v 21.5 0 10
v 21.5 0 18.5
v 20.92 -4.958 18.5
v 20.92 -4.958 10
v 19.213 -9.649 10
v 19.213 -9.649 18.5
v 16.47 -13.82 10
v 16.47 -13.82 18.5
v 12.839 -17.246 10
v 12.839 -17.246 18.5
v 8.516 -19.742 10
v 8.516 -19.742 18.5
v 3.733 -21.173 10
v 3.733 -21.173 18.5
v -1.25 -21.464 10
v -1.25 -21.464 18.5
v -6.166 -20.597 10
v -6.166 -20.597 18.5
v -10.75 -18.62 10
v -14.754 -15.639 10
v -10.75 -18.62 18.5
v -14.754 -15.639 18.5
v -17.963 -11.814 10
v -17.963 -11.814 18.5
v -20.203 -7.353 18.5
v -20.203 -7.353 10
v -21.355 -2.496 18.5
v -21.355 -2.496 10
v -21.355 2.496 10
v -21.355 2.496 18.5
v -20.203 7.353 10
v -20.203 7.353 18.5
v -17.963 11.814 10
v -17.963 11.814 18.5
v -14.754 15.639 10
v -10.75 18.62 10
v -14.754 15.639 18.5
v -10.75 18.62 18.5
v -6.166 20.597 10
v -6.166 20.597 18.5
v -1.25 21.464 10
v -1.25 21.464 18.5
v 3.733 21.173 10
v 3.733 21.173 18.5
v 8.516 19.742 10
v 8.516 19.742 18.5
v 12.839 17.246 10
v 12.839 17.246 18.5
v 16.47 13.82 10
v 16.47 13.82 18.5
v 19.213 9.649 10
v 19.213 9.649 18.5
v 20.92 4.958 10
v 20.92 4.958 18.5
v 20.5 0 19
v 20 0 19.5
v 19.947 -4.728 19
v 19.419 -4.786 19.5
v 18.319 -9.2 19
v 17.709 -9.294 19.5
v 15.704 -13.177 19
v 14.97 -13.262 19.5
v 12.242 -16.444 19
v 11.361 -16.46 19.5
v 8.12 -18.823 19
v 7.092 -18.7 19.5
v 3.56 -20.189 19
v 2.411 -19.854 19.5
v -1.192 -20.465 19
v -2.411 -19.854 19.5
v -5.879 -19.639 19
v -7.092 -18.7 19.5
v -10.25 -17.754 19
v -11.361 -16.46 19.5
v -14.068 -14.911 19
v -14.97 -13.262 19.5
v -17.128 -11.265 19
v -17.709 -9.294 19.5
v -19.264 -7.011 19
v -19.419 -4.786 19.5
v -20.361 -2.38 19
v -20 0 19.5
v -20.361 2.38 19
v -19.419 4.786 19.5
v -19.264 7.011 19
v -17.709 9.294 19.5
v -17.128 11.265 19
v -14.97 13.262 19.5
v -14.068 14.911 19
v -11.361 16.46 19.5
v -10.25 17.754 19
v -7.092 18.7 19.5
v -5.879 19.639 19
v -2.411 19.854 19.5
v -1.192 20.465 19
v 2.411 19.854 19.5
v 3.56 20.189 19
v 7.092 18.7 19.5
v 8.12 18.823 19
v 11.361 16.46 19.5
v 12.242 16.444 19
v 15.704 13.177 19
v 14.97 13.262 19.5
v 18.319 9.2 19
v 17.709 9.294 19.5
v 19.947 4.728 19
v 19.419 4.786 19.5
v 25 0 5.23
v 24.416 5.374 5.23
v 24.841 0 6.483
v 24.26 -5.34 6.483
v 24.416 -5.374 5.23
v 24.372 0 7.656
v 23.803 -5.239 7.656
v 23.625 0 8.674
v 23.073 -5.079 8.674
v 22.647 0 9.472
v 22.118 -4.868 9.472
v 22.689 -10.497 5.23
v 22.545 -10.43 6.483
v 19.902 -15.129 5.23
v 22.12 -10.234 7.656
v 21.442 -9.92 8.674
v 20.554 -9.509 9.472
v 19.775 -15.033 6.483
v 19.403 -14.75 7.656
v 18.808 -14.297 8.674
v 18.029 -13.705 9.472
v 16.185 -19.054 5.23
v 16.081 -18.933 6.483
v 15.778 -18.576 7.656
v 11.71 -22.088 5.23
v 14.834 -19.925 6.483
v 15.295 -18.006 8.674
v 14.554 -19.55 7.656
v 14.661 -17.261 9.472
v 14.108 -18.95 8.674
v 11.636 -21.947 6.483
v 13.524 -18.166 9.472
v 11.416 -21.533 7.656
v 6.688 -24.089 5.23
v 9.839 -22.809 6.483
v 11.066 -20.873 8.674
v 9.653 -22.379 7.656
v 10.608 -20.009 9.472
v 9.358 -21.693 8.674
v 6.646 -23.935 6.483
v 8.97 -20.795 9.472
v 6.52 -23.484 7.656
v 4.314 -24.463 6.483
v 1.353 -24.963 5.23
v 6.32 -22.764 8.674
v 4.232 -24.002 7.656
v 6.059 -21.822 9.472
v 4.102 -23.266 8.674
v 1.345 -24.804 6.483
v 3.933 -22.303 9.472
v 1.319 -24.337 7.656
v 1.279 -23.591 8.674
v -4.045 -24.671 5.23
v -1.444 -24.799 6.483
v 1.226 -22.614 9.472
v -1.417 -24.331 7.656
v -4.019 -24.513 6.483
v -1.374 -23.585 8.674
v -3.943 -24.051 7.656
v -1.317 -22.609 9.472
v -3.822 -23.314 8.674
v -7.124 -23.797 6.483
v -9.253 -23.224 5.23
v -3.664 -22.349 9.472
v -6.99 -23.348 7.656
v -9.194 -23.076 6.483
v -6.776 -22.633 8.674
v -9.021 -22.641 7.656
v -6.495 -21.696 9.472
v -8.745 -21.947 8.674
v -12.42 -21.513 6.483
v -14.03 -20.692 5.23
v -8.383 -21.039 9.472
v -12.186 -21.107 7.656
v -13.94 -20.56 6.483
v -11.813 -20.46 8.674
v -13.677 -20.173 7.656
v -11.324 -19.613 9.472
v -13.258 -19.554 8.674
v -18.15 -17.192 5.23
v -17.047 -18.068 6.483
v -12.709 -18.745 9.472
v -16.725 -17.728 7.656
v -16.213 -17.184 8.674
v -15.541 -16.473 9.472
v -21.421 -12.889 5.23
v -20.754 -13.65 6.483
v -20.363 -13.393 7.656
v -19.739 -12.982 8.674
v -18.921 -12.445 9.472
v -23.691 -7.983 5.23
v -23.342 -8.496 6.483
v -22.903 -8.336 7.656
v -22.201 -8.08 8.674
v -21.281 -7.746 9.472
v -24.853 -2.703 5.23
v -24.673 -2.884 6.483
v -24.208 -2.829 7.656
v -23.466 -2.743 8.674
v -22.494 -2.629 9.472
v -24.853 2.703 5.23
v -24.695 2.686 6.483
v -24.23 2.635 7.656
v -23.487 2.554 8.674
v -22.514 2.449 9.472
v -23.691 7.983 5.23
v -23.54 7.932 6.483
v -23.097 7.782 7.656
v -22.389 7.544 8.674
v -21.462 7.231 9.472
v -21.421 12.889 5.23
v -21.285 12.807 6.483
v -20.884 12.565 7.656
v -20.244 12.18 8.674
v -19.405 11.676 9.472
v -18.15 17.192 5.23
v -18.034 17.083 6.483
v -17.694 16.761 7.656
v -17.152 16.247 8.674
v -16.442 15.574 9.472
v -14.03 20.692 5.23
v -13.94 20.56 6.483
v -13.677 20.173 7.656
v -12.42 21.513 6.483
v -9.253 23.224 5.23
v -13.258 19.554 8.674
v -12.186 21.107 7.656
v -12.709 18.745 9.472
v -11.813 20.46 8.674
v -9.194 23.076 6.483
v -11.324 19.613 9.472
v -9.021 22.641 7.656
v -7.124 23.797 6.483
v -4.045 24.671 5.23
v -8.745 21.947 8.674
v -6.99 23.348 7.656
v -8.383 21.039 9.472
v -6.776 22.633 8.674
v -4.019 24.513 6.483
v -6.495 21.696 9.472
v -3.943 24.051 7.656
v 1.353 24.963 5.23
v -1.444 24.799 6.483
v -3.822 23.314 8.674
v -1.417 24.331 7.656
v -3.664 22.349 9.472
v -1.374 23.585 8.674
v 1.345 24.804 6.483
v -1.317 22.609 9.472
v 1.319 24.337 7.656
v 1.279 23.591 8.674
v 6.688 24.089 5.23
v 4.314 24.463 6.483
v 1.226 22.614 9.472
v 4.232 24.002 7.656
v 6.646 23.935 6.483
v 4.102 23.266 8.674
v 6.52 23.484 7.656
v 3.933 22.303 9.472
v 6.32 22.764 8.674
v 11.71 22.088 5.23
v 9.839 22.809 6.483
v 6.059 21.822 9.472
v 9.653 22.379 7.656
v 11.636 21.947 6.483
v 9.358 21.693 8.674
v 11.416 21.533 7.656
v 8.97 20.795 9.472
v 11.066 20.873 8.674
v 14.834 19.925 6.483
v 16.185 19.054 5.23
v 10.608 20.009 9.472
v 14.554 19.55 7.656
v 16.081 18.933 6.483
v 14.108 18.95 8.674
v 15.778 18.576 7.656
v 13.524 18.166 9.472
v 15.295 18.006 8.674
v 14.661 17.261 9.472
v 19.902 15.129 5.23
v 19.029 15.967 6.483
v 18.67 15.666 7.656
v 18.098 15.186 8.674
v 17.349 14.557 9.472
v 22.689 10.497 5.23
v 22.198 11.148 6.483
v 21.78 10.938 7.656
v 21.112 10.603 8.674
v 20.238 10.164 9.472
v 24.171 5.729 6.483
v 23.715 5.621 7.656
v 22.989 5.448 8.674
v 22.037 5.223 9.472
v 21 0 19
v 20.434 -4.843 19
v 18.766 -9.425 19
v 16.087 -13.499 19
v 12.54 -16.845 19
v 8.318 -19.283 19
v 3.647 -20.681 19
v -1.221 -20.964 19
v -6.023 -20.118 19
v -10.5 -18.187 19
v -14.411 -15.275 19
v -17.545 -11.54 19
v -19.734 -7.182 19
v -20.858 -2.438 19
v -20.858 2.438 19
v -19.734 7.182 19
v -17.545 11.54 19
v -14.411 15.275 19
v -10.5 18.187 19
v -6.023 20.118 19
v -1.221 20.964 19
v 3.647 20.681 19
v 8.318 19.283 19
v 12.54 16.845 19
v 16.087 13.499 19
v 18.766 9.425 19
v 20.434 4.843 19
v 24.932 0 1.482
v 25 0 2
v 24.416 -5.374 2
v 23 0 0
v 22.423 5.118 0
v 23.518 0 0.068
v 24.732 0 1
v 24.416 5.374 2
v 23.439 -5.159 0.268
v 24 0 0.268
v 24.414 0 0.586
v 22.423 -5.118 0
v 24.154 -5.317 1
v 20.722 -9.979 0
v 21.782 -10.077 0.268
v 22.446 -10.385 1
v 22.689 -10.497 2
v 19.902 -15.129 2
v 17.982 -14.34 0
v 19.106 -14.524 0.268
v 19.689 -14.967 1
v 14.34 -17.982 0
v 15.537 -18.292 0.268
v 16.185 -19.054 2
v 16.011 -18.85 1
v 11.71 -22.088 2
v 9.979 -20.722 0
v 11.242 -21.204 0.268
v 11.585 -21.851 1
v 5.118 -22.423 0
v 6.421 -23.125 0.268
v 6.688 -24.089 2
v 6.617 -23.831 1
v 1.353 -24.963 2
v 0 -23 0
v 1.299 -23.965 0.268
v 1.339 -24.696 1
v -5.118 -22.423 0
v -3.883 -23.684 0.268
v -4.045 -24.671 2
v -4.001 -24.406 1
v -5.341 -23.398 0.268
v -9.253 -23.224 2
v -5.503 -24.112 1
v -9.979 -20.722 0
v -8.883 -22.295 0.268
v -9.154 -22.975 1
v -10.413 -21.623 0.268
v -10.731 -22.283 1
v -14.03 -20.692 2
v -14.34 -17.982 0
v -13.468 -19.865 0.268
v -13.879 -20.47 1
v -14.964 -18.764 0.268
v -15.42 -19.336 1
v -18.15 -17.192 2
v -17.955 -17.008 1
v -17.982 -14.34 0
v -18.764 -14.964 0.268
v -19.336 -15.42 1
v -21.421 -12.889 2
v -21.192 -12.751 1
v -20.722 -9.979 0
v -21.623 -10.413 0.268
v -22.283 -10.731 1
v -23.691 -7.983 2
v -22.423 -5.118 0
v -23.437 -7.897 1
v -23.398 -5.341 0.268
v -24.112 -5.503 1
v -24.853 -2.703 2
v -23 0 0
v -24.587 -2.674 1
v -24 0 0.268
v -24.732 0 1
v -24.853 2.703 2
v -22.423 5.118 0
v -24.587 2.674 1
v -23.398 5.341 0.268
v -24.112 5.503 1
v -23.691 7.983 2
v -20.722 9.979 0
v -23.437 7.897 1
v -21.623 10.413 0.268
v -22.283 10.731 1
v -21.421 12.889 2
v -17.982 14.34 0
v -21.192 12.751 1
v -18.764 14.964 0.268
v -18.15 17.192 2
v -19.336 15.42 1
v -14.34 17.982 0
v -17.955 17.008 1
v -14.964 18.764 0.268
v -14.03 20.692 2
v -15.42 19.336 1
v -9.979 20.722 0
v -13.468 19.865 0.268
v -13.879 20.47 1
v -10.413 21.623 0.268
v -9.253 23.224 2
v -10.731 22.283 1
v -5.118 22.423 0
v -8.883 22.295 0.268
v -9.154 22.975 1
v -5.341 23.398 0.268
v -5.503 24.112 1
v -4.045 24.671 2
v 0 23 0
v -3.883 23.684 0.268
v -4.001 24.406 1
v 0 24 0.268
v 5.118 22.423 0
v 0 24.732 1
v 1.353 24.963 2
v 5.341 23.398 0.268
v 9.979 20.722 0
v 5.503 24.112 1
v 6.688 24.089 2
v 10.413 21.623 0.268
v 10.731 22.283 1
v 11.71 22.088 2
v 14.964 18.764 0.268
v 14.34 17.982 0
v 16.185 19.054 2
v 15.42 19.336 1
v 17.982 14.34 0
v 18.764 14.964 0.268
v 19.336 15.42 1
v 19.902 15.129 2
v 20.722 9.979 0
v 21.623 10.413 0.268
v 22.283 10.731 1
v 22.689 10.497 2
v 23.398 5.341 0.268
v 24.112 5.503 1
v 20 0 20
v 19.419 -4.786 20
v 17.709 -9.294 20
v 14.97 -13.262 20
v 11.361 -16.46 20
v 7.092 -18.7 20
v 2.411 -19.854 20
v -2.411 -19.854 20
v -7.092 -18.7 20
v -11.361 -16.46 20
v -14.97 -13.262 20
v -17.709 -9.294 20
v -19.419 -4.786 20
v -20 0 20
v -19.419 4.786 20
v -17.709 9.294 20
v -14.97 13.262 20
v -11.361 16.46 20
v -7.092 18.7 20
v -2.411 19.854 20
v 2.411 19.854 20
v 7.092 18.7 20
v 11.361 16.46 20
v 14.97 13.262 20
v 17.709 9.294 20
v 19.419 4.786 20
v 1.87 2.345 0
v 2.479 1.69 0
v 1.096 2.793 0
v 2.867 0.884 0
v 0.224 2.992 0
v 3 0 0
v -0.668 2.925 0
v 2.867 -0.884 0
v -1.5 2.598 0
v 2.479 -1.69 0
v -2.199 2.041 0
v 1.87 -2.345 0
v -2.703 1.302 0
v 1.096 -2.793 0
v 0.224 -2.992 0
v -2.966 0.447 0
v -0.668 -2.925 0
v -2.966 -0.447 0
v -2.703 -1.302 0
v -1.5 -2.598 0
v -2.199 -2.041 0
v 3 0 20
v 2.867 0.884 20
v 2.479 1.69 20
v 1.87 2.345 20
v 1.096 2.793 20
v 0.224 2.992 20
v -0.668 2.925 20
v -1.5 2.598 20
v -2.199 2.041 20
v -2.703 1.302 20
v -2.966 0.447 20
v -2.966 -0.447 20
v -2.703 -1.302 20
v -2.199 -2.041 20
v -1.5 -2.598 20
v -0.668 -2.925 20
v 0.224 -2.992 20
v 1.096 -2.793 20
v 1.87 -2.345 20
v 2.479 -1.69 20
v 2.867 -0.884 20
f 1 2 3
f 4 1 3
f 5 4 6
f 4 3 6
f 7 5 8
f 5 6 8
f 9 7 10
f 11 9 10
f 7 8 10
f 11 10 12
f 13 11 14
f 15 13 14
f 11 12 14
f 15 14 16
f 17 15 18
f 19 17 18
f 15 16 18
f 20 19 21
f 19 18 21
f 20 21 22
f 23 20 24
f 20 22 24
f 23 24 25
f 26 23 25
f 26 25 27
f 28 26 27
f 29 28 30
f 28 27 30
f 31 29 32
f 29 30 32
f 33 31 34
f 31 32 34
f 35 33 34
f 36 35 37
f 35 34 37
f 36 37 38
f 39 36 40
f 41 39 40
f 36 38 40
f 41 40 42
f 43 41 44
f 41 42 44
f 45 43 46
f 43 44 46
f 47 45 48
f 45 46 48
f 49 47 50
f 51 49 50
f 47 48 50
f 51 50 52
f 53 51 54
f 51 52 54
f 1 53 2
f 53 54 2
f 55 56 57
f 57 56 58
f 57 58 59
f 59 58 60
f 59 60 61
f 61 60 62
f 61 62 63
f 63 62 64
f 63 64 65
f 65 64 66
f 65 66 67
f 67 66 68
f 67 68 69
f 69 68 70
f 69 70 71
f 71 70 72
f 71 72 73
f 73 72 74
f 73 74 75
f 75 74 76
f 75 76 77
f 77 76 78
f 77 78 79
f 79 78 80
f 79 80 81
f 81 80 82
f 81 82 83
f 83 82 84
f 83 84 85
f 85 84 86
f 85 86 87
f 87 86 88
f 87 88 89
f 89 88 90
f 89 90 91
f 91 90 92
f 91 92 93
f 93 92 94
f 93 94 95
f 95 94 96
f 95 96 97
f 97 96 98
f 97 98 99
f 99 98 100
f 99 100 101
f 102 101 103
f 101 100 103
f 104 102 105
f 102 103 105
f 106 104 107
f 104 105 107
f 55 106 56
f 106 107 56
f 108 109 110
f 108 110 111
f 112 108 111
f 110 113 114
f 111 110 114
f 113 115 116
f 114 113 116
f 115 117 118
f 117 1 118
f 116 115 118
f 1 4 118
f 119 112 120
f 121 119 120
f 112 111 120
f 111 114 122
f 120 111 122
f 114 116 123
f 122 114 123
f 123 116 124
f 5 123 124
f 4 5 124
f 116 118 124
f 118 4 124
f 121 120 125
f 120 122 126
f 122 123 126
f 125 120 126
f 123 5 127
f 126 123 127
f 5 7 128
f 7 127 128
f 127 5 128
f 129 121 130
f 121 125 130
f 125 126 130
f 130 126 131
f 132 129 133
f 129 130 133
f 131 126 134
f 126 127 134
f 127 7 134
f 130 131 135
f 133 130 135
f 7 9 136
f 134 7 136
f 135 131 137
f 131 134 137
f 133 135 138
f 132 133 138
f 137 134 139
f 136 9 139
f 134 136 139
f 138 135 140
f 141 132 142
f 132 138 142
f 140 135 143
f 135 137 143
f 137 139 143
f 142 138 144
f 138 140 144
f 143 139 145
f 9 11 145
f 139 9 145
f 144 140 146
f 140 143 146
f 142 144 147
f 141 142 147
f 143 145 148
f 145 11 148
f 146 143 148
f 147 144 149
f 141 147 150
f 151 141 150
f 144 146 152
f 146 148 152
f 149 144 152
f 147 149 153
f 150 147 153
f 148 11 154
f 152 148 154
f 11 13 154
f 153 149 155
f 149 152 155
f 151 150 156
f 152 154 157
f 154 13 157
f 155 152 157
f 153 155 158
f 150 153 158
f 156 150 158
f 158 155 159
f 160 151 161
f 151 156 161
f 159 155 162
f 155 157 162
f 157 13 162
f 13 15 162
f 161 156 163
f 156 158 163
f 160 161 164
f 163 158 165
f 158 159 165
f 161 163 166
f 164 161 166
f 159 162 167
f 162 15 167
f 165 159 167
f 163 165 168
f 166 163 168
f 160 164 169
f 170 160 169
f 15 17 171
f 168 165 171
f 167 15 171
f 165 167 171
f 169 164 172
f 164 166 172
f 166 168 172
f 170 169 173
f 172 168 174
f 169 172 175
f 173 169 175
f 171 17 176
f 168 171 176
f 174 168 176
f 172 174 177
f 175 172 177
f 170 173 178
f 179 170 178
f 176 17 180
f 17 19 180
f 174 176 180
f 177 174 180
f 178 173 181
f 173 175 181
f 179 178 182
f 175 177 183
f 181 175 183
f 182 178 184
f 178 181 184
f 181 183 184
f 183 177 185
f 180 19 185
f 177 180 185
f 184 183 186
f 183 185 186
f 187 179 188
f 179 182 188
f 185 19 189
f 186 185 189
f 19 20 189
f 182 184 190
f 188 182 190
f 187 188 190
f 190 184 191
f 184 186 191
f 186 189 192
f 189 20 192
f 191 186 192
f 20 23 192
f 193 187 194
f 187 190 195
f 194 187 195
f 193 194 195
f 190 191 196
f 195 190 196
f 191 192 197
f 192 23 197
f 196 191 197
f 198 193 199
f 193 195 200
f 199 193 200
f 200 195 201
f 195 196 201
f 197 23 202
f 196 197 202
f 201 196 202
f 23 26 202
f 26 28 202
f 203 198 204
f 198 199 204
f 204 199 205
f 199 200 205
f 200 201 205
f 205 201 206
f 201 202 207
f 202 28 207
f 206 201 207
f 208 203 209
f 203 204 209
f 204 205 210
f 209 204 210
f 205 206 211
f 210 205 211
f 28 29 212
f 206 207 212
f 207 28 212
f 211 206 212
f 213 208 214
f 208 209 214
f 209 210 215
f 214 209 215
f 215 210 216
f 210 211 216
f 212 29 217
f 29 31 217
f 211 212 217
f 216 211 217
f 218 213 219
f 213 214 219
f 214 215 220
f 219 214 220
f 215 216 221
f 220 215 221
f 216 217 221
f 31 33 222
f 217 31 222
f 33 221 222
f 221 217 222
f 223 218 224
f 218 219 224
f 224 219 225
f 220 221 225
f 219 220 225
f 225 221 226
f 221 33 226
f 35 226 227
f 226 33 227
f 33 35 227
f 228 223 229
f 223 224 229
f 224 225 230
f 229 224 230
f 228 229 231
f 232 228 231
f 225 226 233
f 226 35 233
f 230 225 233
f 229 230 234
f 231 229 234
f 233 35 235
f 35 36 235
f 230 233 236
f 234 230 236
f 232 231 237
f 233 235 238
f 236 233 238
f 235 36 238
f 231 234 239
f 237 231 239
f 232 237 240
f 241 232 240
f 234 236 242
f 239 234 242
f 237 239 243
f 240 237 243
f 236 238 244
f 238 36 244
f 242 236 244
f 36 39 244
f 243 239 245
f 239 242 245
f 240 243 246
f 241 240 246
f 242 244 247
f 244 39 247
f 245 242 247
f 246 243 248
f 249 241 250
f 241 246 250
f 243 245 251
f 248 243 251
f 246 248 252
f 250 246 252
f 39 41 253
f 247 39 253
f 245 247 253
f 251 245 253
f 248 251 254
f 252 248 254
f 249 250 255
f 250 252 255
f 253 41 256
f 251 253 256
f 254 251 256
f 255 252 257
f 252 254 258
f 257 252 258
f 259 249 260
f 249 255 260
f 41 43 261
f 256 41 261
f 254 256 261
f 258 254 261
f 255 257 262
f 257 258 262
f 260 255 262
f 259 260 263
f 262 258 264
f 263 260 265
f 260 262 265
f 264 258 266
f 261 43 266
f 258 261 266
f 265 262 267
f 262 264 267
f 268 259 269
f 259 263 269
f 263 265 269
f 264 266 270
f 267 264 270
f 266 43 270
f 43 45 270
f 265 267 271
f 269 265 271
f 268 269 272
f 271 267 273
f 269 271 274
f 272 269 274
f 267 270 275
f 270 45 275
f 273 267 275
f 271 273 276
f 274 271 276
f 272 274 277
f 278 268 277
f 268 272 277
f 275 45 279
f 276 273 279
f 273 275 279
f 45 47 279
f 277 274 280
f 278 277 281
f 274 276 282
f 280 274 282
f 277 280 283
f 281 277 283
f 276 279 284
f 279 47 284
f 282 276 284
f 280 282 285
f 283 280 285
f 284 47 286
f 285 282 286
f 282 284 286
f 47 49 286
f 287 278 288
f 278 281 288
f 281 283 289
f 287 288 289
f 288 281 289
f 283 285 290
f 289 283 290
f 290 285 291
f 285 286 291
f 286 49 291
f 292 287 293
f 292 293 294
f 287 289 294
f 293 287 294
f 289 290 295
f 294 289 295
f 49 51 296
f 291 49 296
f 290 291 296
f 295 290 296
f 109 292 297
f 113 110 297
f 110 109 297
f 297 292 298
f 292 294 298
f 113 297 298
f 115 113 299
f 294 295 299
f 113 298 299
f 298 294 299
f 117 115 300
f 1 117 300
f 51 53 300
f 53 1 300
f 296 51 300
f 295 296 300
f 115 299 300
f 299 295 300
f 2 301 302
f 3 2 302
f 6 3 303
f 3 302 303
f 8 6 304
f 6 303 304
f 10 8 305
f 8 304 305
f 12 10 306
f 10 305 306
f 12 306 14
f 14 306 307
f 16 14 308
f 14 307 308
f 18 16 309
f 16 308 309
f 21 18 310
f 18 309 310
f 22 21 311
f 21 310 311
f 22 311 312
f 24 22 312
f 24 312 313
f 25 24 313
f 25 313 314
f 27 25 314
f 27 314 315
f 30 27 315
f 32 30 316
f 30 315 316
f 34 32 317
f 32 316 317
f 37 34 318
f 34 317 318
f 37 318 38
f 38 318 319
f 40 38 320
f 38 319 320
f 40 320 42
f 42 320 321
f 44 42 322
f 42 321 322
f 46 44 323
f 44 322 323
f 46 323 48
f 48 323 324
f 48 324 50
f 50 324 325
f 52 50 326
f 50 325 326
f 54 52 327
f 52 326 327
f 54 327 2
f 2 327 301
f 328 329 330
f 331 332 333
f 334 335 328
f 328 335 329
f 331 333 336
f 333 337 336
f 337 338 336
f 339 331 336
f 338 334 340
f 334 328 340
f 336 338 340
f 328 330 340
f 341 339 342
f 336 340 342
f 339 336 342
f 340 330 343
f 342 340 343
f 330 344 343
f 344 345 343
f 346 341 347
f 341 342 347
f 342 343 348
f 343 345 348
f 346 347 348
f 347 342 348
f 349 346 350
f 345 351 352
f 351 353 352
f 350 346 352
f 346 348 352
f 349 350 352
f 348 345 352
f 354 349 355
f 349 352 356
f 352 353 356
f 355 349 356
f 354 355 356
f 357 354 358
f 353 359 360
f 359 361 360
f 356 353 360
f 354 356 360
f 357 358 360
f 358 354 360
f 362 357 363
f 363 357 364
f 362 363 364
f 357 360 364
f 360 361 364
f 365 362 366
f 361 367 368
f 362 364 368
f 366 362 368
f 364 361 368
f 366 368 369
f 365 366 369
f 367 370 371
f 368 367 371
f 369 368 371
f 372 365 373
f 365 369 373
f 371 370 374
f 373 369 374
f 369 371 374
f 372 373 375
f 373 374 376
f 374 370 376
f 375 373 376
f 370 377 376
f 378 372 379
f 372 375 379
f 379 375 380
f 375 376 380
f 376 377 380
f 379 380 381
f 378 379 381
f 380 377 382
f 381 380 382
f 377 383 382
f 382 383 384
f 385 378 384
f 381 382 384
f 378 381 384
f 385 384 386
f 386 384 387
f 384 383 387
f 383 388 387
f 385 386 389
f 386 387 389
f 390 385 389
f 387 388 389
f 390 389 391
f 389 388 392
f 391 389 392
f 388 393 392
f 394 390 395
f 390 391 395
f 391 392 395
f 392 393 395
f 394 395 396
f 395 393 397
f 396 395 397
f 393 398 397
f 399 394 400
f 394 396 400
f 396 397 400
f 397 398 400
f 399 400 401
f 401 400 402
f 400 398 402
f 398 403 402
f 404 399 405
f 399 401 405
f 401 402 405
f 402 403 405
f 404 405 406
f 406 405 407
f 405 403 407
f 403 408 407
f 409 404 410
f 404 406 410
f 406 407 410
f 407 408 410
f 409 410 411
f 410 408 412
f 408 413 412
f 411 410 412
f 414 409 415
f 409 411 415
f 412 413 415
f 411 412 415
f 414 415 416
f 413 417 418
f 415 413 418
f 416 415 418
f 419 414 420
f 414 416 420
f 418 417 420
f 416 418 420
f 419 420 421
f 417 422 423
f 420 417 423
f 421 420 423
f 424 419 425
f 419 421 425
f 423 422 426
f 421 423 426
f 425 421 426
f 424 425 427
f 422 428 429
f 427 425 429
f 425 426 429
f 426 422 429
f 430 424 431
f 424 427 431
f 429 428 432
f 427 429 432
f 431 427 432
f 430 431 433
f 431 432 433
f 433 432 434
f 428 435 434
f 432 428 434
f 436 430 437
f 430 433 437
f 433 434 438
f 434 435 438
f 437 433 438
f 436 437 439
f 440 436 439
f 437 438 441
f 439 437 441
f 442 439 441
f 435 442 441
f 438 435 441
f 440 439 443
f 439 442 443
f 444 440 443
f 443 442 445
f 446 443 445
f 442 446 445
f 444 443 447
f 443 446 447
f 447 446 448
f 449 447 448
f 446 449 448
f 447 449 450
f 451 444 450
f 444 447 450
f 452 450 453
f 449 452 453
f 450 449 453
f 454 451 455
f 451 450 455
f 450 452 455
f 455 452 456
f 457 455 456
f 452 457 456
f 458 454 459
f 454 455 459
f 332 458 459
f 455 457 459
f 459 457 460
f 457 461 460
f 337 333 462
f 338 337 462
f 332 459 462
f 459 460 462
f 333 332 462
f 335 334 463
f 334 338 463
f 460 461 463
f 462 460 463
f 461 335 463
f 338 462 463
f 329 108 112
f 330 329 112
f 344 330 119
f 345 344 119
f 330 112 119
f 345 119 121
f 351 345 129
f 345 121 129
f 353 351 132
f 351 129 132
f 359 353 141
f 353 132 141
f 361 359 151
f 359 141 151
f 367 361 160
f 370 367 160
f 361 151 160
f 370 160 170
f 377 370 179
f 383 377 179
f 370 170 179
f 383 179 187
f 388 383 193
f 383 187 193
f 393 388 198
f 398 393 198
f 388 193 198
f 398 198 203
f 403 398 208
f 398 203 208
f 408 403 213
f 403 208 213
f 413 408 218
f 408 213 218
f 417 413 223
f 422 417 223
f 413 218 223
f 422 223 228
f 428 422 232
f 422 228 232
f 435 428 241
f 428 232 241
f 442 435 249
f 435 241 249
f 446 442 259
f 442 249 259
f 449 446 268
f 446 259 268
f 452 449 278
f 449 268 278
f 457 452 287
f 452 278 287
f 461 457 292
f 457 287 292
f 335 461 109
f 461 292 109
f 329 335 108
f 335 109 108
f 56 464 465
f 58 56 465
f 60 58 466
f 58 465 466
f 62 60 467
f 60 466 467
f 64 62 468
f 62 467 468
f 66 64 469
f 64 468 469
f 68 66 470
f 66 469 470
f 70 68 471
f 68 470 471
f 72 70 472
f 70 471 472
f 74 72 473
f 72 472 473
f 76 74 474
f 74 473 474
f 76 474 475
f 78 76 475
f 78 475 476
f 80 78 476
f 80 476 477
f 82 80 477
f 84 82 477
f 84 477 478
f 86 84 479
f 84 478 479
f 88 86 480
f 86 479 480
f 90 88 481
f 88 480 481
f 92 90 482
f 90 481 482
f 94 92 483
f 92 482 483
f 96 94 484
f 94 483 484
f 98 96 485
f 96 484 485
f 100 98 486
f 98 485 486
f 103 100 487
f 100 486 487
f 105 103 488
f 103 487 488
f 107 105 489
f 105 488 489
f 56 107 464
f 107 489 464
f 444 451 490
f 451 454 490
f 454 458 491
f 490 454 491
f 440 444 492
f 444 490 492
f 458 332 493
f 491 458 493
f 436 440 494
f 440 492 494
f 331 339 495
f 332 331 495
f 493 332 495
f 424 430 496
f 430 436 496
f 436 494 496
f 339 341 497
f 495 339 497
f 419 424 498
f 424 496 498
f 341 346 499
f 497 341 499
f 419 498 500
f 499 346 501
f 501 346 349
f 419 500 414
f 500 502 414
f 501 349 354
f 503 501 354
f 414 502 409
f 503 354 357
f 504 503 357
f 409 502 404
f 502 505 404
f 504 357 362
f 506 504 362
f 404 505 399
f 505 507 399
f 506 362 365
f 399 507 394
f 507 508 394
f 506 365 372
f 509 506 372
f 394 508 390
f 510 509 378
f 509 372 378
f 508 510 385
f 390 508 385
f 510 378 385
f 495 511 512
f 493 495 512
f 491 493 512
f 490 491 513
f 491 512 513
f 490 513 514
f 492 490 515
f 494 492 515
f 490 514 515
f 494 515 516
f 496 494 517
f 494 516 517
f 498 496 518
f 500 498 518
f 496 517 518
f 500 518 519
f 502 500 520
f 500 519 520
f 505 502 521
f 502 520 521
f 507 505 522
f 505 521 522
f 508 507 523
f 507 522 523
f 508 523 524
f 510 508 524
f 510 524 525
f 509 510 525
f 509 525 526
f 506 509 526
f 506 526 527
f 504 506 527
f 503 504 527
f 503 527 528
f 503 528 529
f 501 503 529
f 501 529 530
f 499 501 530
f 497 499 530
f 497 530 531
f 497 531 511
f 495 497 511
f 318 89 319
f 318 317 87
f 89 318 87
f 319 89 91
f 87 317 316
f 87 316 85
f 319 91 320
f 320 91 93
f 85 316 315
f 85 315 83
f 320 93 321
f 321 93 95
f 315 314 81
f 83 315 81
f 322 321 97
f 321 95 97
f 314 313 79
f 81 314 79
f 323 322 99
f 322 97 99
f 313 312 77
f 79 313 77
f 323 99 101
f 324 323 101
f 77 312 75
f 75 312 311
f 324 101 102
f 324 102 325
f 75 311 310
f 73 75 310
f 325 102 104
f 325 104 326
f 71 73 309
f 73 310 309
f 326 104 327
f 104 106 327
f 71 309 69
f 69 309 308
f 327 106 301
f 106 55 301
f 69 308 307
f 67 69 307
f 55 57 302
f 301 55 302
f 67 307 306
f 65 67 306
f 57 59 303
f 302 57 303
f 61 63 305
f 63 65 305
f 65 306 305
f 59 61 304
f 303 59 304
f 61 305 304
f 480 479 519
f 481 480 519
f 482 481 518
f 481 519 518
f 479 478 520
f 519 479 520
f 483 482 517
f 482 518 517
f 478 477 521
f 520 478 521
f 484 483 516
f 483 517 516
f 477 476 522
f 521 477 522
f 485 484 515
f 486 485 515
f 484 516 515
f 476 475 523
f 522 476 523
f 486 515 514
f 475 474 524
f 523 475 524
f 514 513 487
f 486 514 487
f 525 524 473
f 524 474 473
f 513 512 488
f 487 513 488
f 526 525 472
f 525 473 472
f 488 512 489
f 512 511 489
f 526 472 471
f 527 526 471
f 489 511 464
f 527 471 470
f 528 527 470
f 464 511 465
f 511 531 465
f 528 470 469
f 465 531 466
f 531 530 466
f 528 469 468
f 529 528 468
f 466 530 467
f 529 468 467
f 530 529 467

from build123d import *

# Parameters (mm, degrees)
F3_R     = 2
F4_SIZE  = 0.5
F5_R     = 3
F6_DEPTH = 20.001


# Not quite as in the source:
# - a fillet or chamfer that OpenCascade refuses, or shapes differently, is made with other operations: its cross-section is extruded or revolved along the edge and cut away or added


with BuildPart() as f1:
    # F0 (on Front) → F1 (revolve)
    with BuildSketch(Plane.XZ):
        Polygon((0, 20), (0, 0), (25, 0), (25, 10), (21.5, 10), (21.5, 19), (20, 19), (20, 20), align=None)
    revolve(axis=Axis((0, 0, 11.1239180034), (0, 0, -1)))

    # F2: fillet of radius 5 on 1 edges, made by hand

    # F2_s1 → F2_t2 (revolve, cut)
    with BuildSketch(Plane.XZ):
        with BuildLine():
            ThreePointArc((25, 5.2303039929), (24.0311288741, 8.1883438845), (21.5, 10))
            Line((21.5, 10), (25, 10))
            Line((25, 10), (25, 5.2303039929))
        make_face()
    revolve(axis=Axis((0, 0, 10), (0, 0, -1)), mode=Mode.SUBTRACT)

    # F3
    f3_edges = [f1.edges().sort_by_distance(p)[0] for p in [
        (-25, 0, 0),
    ]]
    fillet(f3_edges, radius=F3_R)

    # F4
    f4_edges = [f1.edges().sort_by_distance(p)[0] for p in [
        (-21.5, 0, 19),
        (-20, 0, 19),
    ]]
    chamfer(f4_edges, length=F4_SIZE)

    # F5 (on face) → F6 (cut, through all)
    with BuildSketch(Plane.XY.offset(20)):
        Circle(F5_R)
    extrude(amount=-F6_DEPTH, mode=Mode.SUBTRACT)


solid = f1.part
